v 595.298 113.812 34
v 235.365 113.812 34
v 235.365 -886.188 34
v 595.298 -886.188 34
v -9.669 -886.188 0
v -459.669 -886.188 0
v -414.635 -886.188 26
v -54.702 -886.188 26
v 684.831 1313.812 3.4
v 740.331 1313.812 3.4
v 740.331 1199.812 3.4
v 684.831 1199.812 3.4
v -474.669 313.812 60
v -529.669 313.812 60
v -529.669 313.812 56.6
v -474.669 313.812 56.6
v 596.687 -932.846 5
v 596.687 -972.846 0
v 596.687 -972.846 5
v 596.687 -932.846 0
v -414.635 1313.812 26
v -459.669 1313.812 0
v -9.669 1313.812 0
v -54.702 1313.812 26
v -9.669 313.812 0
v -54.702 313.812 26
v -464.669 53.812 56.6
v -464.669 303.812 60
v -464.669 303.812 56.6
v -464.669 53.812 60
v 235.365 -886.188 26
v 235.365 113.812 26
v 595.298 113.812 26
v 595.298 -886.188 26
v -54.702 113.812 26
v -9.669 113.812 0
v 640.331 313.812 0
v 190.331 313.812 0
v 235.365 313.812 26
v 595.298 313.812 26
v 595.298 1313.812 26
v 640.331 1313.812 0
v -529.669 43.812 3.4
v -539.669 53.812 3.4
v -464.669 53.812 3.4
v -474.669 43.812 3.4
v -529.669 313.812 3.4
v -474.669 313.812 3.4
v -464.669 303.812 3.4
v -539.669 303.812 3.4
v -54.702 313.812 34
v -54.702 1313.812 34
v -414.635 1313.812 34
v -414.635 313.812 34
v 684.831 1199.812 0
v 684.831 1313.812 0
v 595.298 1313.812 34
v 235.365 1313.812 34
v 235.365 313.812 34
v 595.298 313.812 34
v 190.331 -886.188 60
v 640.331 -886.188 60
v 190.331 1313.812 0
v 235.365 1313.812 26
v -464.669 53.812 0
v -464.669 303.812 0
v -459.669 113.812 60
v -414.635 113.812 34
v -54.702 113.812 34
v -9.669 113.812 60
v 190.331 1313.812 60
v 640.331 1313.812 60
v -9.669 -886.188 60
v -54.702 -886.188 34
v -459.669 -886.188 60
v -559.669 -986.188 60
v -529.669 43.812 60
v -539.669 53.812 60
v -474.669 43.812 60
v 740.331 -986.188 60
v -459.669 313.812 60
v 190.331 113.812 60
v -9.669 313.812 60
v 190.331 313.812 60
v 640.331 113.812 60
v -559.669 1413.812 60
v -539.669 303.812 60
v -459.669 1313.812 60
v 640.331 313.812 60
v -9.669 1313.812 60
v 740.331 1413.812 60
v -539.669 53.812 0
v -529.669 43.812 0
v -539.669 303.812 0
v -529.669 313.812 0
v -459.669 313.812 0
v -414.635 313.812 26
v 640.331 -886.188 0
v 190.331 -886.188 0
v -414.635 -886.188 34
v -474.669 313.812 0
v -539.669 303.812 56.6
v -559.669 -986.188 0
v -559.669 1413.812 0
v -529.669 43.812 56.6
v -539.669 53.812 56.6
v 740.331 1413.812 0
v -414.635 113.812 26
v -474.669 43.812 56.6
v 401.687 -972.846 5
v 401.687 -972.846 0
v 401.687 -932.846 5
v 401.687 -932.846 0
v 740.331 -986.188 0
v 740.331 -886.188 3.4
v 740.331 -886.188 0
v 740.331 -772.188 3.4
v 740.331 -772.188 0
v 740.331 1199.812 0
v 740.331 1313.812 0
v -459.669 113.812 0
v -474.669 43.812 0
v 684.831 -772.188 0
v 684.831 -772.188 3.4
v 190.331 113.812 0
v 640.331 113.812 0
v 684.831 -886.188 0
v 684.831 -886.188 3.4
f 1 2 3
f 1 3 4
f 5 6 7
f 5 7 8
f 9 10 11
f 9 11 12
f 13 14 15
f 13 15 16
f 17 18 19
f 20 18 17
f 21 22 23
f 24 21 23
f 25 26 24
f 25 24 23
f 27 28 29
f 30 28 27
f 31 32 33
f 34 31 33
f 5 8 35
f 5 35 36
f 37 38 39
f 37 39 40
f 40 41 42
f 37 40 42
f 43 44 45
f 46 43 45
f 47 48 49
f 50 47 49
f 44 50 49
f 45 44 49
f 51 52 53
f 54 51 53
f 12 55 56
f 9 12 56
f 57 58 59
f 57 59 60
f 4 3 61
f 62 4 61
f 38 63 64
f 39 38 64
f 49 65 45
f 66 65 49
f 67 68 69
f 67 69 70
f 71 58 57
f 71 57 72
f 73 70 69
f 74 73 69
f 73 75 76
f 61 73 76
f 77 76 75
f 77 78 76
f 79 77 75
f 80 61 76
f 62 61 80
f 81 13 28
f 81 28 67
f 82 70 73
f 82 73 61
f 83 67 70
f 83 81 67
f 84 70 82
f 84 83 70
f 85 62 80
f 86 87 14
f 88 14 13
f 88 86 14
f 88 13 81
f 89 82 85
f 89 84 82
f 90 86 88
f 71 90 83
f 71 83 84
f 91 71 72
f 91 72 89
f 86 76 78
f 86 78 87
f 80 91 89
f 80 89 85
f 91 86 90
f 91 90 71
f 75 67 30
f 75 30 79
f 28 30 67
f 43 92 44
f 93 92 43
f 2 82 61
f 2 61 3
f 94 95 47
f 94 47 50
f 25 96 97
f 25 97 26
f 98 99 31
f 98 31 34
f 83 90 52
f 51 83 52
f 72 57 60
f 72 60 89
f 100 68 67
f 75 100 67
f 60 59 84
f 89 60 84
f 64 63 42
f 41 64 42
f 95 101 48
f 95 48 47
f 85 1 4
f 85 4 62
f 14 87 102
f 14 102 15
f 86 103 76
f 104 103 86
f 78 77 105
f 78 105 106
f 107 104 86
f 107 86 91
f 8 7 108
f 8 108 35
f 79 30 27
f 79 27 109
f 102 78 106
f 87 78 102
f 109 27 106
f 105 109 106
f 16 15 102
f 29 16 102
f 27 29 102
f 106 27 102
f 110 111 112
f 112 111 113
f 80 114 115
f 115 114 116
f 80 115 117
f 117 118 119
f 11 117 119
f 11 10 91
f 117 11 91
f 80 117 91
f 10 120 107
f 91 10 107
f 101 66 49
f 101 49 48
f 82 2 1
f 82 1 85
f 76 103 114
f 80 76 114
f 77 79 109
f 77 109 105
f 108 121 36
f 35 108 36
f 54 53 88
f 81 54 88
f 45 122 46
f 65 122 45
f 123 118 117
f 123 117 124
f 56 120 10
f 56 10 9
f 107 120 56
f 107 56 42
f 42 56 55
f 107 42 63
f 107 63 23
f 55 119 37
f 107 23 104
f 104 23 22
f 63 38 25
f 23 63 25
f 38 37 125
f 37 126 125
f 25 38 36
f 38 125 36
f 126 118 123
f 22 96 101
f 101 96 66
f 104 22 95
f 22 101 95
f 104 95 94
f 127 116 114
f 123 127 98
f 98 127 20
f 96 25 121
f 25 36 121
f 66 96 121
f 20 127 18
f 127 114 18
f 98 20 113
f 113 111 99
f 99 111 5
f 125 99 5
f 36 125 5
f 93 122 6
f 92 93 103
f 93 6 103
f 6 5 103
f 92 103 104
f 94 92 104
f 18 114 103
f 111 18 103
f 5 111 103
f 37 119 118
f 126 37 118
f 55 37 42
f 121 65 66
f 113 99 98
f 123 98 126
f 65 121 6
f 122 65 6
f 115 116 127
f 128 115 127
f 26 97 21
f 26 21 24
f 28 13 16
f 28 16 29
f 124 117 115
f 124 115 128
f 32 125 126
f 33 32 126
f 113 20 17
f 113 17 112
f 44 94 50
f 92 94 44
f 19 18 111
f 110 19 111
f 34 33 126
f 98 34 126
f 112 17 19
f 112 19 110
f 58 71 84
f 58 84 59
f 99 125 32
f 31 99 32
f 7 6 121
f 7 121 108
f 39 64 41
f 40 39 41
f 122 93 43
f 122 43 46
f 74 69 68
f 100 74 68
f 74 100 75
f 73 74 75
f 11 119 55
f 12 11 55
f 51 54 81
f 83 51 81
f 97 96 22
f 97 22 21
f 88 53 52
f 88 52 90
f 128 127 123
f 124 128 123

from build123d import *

# Parameters (mm, degrees)
SKETCH1_W                = 1300
SKETCH1_H                = 2400
BOSS_EXTRUDE1_DEPTH      = 60
CUT_EXTRUDE4_DEPTH       = 1100
CUT_EXTRUDE4_DEPTH_BACK  = 1100
BOSS_EXTRUDE2_DEPTH      = 100
BOSS_EXTRUDE2_DEPTH_BACK = 100
SKETCH7_W                = 55.5
SKETCH7_H                = 114
CUT_EXTRUDE5_DEPTH       = 3.4
CUT_EXTRUDE6_DEPTH       = 3.4
SKETCH13_W               = 195
SKETCH13_H               = 40
CUT_EXTRUDE7_DEPTH       = 5


with BuildPart() as part:
    # Sketch1 → Boss-Extrude1 (new body)
    with BuildSketch(Plane.XY):
        with Locations((90.331491713, 213.812154696)):
            Rectangle(SKETCH1_W, SKETCH1_H)
    extrude(amount=BOSS_EXTRUDE1_DEPTH)

    # Sketch5 → Cut-Extrude4 (cut, two sides)
    with BuildSketch(Plane(origin=(0, 213.812154696, 0), x_dir=(-1, 0, 0), z_dir=(0, -1, 0))) as cut_extrude4_sk:
        Polygon((-190.331491713, 0), (-235.364812709, -26), (-595.298170716, -26), (-640.331491713, 0), align=None)
        Polygon((9.668508287, 0), (459.668508287, 0), (414.635187291, -26), (54.701829284, -26), align=None)
        Polygon((414.635187291, -34), (459.668508287, -60), (9.668508287, -60), (54.701829284, -34), align=None)
        Polygon((-190.331491713, -60), (-235.364812709, -34), (-595.298170716, -34), (-640.331491713, -60), align=None)
    extrude(amount=CUT_EXTRUDE4_DEPTH, mode=Mode.SUBTRACT)
    extrude(cut_extrude4_sk.sketch, amount=-CUT_EXTRUDE4_DEPTH_BACK, mode=Mode.SUBTRACT)

    # Sketch6 → Boss-Extrude2 (add, two sides)
    with BuildSketch(Plane(origin=(0, 213.812154696, 0), x_dir=(-1, 0, 0), z_dir=(0, -1, 0))) as boss_extrude2_sk:
        Polygon((-190.331491713, 0), (-235.364812709, -26), (-595.298170716, -26), (-640.331491713, 0), align=None)
        Polygon((9.668508287, 0), (459.668508287, 0), (414.635187291, -26), (54.701829284, -26), align=None)
        Polygon((414.635187291, -34), (459.668508287, -60), (9.668508287, -60), (54.701829284, -34), align=None)
        Polygon((-190.331491713, -60), (-235.364812709, -34), (-595.298170716, -34), (-640.331491713, -60), align=None)
    extrude(amount=BOSS_EXTRUDE2_DEPTH)
    extrude(boss_extrude2_sk.sketch, amount=-BOSS_EXTRUDE2_DEPTH_BACK)

    # Sketch7 → Cut-Extrude5 (cut)
    with BuildSketch(Plane(origin=(0, 0, 0), x_dir=(-1, 0, 0), z_dir=(0, 0, -1))):
        with Locations((-712.581491713, 1256.812154696)):
            Rectangle(SKETCH7_W, SKETCH7_H)
        with Locations((-712.581491713, -829.187845304)):
            Rectangle(SKETCH7_W, SKETCH7_H)
        Polygon((474.668508287, 313.812154696), (529.668508287, 313.812154696), (539.668508287, 303.812154696), (539.668508287, 53.812154696), (529.668508287, 43.812154696), (474.668508287, 43.812154696), (464.668508287, 53.812154696), (464.668508287, 303.812154696), align=None)
    extrude(amount=-CUT_EXTRUDE5_DEPTH, mode=Mode.SUBTRACT)

    # Sketch10 → Cut-Extrude6 (cut)
    with BuildSketch(Plane.XY.offset(60)):
        Polygon((-529.668508287, 313.812154696), (-474.668508287, 313.812154696), (-464.668508287, 303.812154696), (-464.668508287, 53.812154696), (-474.668508287, 43.812154696), (-529.668508287, 43.812154696), (-539.668508287, 53.812154696), (-539.668508287, 303.812154696), align=None)
    extrude(amount=-CUT_EXTRUDE6_DEPTH, mode=Mode.SUBTRACT)

    # Sketch13 → Cut-Extrude7 (cut)
    with BuildSketch(Plane(origin=(0, 0, 0), x_dir=(-1, 0, 0), z_dir=(0, 0, -1))):
        with Locations((-499.186786697, -952.846120584)):
            Rectangle(SKETCH13_W, SKETCH13_H)
    extrude(amount=-CUT_EXTRUDE7_DEPTH, mode=Mode.SUBTRACT)


solid = part.part
